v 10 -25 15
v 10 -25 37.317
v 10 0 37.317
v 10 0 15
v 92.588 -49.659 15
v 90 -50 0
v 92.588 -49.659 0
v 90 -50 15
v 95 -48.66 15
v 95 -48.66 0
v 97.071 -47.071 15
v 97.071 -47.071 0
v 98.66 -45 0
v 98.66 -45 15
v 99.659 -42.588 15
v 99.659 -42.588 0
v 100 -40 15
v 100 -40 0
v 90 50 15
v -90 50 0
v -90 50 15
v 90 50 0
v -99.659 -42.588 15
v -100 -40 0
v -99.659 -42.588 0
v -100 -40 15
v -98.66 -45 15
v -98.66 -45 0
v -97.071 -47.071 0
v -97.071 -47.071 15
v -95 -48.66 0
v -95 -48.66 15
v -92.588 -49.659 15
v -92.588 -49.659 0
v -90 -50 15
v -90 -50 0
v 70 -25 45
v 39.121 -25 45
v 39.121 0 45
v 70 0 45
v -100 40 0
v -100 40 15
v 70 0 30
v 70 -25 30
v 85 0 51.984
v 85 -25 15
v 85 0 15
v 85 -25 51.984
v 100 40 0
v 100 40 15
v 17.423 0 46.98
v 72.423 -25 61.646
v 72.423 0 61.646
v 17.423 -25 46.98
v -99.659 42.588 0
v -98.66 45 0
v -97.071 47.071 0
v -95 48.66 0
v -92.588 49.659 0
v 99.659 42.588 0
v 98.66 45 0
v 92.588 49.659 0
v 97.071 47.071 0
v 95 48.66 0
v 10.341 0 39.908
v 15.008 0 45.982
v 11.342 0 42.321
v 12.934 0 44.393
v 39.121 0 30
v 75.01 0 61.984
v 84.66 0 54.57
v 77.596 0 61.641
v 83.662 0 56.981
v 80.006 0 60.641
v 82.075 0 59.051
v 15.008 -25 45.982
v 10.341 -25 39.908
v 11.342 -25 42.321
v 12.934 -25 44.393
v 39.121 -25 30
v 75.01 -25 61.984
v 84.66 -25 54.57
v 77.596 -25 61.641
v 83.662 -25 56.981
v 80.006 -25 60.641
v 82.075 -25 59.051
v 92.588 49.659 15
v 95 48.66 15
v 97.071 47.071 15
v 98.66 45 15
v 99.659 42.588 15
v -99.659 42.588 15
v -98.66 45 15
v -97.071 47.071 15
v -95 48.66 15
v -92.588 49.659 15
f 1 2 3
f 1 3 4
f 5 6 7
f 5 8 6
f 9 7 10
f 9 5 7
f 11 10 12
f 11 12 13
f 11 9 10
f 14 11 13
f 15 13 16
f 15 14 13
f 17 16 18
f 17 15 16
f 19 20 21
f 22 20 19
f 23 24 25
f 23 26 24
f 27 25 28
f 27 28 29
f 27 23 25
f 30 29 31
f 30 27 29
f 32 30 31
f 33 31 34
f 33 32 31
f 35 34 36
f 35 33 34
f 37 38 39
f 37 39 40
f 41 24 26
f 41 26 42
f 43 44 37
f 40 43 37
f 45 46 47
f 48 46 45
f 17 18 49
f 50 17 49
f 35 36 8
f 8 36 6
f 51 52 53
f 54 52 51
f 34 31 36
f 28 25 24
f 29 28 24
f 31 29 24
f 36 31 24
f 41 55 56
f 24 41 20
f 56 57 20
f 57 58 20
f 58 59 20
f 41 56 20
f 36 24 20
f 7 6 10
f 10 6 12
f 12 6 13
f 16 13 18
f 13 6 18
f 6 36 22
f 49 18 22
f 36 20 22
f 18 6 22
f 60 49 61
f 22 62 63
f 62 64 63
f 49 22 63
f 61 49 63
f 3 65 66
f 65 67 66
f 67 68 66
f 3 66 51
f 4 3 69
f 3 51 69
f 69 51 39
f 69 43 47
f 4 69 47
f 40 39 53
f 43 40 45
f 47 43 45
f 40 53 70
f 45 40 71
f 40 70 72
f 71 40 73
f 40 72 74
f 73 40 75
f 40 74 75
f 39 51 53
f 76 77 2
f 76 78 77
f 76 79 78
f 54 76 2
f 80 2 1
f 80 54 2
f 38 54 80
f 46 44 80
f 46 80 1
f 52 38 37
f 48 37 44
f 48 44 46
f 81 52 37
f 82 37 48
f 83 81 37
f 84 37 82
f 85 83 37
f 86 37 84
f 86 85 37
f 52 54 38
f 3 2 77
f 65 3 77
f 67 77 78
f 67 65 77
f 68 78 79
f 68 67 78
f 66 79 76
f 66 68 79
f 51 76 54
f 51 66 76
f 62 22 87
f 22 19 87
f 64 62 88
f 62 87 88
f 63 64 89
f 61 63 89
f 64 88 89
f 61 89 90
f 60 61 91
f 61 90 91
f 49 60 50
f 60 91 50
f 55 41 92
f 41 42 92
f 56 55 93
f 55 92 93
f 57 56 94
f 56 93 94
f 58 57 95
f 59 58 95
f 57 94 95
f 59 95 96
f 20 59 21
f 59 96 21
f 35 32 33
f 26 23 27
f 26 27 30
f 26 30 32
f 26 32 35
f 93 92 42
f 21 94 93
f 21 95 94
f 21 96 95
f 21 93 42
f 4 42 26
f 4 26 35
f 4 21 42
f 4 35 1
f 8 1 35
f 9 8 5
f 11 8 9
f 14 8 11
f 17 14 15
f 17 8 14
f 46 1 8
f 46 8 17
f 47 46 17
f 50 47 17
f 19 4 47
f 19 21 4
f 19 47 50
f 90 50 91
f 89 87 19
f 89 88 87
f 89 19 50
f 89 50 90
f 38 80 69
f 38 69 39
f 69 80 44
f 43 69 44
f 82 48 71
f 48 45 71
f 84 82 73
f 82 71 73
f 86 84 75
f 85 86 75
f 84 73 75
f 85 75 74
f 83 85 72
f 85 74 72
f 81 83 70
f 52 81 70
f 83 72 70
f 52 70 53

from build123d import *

# Parameters (mm, degrees)
F0_W     = 200
F0_H     = 100
F1_DEPTH = 15
F3_W     = 30.8789272606
F3_H     = 15
F4_DEPTH = 25
F5_R     = 10


with BuildPart() as f1:
    # F0 (on Top) → F1 (new body)
    with BuildSketch(Plane.XY):
        Rectangle(F0_W, F0_H)
    extrude(amount=F1_DEPTH)

    # F3 (on offset) → F4 (join)
    with BuildSketch(Plane.XZ.offset(25)):
        Polygon((10, 15), (85, 15), (85, 65), (10, 45), align=None)
        with Locations((54.5605363697, 37.5)):
            Rectangle(F3_W, F3_H, mode=Mode.SUBTRACT)
    extrude(amount=-F4_DEPTH)

    # F5
    f5_edges = [f1.edges().sort_by_distance(p)[0] for p in [
        (-100, 50, 7.5),
        (-100, -50, 7.5),
        (100, -50, 7.5),
        (100, 50, 7.5),
        (10, -12.5, 45),
        (85, -12.5, 65),
    ]]
    fillet(f5_edges, radius=F5_R)


solid = f1.part
